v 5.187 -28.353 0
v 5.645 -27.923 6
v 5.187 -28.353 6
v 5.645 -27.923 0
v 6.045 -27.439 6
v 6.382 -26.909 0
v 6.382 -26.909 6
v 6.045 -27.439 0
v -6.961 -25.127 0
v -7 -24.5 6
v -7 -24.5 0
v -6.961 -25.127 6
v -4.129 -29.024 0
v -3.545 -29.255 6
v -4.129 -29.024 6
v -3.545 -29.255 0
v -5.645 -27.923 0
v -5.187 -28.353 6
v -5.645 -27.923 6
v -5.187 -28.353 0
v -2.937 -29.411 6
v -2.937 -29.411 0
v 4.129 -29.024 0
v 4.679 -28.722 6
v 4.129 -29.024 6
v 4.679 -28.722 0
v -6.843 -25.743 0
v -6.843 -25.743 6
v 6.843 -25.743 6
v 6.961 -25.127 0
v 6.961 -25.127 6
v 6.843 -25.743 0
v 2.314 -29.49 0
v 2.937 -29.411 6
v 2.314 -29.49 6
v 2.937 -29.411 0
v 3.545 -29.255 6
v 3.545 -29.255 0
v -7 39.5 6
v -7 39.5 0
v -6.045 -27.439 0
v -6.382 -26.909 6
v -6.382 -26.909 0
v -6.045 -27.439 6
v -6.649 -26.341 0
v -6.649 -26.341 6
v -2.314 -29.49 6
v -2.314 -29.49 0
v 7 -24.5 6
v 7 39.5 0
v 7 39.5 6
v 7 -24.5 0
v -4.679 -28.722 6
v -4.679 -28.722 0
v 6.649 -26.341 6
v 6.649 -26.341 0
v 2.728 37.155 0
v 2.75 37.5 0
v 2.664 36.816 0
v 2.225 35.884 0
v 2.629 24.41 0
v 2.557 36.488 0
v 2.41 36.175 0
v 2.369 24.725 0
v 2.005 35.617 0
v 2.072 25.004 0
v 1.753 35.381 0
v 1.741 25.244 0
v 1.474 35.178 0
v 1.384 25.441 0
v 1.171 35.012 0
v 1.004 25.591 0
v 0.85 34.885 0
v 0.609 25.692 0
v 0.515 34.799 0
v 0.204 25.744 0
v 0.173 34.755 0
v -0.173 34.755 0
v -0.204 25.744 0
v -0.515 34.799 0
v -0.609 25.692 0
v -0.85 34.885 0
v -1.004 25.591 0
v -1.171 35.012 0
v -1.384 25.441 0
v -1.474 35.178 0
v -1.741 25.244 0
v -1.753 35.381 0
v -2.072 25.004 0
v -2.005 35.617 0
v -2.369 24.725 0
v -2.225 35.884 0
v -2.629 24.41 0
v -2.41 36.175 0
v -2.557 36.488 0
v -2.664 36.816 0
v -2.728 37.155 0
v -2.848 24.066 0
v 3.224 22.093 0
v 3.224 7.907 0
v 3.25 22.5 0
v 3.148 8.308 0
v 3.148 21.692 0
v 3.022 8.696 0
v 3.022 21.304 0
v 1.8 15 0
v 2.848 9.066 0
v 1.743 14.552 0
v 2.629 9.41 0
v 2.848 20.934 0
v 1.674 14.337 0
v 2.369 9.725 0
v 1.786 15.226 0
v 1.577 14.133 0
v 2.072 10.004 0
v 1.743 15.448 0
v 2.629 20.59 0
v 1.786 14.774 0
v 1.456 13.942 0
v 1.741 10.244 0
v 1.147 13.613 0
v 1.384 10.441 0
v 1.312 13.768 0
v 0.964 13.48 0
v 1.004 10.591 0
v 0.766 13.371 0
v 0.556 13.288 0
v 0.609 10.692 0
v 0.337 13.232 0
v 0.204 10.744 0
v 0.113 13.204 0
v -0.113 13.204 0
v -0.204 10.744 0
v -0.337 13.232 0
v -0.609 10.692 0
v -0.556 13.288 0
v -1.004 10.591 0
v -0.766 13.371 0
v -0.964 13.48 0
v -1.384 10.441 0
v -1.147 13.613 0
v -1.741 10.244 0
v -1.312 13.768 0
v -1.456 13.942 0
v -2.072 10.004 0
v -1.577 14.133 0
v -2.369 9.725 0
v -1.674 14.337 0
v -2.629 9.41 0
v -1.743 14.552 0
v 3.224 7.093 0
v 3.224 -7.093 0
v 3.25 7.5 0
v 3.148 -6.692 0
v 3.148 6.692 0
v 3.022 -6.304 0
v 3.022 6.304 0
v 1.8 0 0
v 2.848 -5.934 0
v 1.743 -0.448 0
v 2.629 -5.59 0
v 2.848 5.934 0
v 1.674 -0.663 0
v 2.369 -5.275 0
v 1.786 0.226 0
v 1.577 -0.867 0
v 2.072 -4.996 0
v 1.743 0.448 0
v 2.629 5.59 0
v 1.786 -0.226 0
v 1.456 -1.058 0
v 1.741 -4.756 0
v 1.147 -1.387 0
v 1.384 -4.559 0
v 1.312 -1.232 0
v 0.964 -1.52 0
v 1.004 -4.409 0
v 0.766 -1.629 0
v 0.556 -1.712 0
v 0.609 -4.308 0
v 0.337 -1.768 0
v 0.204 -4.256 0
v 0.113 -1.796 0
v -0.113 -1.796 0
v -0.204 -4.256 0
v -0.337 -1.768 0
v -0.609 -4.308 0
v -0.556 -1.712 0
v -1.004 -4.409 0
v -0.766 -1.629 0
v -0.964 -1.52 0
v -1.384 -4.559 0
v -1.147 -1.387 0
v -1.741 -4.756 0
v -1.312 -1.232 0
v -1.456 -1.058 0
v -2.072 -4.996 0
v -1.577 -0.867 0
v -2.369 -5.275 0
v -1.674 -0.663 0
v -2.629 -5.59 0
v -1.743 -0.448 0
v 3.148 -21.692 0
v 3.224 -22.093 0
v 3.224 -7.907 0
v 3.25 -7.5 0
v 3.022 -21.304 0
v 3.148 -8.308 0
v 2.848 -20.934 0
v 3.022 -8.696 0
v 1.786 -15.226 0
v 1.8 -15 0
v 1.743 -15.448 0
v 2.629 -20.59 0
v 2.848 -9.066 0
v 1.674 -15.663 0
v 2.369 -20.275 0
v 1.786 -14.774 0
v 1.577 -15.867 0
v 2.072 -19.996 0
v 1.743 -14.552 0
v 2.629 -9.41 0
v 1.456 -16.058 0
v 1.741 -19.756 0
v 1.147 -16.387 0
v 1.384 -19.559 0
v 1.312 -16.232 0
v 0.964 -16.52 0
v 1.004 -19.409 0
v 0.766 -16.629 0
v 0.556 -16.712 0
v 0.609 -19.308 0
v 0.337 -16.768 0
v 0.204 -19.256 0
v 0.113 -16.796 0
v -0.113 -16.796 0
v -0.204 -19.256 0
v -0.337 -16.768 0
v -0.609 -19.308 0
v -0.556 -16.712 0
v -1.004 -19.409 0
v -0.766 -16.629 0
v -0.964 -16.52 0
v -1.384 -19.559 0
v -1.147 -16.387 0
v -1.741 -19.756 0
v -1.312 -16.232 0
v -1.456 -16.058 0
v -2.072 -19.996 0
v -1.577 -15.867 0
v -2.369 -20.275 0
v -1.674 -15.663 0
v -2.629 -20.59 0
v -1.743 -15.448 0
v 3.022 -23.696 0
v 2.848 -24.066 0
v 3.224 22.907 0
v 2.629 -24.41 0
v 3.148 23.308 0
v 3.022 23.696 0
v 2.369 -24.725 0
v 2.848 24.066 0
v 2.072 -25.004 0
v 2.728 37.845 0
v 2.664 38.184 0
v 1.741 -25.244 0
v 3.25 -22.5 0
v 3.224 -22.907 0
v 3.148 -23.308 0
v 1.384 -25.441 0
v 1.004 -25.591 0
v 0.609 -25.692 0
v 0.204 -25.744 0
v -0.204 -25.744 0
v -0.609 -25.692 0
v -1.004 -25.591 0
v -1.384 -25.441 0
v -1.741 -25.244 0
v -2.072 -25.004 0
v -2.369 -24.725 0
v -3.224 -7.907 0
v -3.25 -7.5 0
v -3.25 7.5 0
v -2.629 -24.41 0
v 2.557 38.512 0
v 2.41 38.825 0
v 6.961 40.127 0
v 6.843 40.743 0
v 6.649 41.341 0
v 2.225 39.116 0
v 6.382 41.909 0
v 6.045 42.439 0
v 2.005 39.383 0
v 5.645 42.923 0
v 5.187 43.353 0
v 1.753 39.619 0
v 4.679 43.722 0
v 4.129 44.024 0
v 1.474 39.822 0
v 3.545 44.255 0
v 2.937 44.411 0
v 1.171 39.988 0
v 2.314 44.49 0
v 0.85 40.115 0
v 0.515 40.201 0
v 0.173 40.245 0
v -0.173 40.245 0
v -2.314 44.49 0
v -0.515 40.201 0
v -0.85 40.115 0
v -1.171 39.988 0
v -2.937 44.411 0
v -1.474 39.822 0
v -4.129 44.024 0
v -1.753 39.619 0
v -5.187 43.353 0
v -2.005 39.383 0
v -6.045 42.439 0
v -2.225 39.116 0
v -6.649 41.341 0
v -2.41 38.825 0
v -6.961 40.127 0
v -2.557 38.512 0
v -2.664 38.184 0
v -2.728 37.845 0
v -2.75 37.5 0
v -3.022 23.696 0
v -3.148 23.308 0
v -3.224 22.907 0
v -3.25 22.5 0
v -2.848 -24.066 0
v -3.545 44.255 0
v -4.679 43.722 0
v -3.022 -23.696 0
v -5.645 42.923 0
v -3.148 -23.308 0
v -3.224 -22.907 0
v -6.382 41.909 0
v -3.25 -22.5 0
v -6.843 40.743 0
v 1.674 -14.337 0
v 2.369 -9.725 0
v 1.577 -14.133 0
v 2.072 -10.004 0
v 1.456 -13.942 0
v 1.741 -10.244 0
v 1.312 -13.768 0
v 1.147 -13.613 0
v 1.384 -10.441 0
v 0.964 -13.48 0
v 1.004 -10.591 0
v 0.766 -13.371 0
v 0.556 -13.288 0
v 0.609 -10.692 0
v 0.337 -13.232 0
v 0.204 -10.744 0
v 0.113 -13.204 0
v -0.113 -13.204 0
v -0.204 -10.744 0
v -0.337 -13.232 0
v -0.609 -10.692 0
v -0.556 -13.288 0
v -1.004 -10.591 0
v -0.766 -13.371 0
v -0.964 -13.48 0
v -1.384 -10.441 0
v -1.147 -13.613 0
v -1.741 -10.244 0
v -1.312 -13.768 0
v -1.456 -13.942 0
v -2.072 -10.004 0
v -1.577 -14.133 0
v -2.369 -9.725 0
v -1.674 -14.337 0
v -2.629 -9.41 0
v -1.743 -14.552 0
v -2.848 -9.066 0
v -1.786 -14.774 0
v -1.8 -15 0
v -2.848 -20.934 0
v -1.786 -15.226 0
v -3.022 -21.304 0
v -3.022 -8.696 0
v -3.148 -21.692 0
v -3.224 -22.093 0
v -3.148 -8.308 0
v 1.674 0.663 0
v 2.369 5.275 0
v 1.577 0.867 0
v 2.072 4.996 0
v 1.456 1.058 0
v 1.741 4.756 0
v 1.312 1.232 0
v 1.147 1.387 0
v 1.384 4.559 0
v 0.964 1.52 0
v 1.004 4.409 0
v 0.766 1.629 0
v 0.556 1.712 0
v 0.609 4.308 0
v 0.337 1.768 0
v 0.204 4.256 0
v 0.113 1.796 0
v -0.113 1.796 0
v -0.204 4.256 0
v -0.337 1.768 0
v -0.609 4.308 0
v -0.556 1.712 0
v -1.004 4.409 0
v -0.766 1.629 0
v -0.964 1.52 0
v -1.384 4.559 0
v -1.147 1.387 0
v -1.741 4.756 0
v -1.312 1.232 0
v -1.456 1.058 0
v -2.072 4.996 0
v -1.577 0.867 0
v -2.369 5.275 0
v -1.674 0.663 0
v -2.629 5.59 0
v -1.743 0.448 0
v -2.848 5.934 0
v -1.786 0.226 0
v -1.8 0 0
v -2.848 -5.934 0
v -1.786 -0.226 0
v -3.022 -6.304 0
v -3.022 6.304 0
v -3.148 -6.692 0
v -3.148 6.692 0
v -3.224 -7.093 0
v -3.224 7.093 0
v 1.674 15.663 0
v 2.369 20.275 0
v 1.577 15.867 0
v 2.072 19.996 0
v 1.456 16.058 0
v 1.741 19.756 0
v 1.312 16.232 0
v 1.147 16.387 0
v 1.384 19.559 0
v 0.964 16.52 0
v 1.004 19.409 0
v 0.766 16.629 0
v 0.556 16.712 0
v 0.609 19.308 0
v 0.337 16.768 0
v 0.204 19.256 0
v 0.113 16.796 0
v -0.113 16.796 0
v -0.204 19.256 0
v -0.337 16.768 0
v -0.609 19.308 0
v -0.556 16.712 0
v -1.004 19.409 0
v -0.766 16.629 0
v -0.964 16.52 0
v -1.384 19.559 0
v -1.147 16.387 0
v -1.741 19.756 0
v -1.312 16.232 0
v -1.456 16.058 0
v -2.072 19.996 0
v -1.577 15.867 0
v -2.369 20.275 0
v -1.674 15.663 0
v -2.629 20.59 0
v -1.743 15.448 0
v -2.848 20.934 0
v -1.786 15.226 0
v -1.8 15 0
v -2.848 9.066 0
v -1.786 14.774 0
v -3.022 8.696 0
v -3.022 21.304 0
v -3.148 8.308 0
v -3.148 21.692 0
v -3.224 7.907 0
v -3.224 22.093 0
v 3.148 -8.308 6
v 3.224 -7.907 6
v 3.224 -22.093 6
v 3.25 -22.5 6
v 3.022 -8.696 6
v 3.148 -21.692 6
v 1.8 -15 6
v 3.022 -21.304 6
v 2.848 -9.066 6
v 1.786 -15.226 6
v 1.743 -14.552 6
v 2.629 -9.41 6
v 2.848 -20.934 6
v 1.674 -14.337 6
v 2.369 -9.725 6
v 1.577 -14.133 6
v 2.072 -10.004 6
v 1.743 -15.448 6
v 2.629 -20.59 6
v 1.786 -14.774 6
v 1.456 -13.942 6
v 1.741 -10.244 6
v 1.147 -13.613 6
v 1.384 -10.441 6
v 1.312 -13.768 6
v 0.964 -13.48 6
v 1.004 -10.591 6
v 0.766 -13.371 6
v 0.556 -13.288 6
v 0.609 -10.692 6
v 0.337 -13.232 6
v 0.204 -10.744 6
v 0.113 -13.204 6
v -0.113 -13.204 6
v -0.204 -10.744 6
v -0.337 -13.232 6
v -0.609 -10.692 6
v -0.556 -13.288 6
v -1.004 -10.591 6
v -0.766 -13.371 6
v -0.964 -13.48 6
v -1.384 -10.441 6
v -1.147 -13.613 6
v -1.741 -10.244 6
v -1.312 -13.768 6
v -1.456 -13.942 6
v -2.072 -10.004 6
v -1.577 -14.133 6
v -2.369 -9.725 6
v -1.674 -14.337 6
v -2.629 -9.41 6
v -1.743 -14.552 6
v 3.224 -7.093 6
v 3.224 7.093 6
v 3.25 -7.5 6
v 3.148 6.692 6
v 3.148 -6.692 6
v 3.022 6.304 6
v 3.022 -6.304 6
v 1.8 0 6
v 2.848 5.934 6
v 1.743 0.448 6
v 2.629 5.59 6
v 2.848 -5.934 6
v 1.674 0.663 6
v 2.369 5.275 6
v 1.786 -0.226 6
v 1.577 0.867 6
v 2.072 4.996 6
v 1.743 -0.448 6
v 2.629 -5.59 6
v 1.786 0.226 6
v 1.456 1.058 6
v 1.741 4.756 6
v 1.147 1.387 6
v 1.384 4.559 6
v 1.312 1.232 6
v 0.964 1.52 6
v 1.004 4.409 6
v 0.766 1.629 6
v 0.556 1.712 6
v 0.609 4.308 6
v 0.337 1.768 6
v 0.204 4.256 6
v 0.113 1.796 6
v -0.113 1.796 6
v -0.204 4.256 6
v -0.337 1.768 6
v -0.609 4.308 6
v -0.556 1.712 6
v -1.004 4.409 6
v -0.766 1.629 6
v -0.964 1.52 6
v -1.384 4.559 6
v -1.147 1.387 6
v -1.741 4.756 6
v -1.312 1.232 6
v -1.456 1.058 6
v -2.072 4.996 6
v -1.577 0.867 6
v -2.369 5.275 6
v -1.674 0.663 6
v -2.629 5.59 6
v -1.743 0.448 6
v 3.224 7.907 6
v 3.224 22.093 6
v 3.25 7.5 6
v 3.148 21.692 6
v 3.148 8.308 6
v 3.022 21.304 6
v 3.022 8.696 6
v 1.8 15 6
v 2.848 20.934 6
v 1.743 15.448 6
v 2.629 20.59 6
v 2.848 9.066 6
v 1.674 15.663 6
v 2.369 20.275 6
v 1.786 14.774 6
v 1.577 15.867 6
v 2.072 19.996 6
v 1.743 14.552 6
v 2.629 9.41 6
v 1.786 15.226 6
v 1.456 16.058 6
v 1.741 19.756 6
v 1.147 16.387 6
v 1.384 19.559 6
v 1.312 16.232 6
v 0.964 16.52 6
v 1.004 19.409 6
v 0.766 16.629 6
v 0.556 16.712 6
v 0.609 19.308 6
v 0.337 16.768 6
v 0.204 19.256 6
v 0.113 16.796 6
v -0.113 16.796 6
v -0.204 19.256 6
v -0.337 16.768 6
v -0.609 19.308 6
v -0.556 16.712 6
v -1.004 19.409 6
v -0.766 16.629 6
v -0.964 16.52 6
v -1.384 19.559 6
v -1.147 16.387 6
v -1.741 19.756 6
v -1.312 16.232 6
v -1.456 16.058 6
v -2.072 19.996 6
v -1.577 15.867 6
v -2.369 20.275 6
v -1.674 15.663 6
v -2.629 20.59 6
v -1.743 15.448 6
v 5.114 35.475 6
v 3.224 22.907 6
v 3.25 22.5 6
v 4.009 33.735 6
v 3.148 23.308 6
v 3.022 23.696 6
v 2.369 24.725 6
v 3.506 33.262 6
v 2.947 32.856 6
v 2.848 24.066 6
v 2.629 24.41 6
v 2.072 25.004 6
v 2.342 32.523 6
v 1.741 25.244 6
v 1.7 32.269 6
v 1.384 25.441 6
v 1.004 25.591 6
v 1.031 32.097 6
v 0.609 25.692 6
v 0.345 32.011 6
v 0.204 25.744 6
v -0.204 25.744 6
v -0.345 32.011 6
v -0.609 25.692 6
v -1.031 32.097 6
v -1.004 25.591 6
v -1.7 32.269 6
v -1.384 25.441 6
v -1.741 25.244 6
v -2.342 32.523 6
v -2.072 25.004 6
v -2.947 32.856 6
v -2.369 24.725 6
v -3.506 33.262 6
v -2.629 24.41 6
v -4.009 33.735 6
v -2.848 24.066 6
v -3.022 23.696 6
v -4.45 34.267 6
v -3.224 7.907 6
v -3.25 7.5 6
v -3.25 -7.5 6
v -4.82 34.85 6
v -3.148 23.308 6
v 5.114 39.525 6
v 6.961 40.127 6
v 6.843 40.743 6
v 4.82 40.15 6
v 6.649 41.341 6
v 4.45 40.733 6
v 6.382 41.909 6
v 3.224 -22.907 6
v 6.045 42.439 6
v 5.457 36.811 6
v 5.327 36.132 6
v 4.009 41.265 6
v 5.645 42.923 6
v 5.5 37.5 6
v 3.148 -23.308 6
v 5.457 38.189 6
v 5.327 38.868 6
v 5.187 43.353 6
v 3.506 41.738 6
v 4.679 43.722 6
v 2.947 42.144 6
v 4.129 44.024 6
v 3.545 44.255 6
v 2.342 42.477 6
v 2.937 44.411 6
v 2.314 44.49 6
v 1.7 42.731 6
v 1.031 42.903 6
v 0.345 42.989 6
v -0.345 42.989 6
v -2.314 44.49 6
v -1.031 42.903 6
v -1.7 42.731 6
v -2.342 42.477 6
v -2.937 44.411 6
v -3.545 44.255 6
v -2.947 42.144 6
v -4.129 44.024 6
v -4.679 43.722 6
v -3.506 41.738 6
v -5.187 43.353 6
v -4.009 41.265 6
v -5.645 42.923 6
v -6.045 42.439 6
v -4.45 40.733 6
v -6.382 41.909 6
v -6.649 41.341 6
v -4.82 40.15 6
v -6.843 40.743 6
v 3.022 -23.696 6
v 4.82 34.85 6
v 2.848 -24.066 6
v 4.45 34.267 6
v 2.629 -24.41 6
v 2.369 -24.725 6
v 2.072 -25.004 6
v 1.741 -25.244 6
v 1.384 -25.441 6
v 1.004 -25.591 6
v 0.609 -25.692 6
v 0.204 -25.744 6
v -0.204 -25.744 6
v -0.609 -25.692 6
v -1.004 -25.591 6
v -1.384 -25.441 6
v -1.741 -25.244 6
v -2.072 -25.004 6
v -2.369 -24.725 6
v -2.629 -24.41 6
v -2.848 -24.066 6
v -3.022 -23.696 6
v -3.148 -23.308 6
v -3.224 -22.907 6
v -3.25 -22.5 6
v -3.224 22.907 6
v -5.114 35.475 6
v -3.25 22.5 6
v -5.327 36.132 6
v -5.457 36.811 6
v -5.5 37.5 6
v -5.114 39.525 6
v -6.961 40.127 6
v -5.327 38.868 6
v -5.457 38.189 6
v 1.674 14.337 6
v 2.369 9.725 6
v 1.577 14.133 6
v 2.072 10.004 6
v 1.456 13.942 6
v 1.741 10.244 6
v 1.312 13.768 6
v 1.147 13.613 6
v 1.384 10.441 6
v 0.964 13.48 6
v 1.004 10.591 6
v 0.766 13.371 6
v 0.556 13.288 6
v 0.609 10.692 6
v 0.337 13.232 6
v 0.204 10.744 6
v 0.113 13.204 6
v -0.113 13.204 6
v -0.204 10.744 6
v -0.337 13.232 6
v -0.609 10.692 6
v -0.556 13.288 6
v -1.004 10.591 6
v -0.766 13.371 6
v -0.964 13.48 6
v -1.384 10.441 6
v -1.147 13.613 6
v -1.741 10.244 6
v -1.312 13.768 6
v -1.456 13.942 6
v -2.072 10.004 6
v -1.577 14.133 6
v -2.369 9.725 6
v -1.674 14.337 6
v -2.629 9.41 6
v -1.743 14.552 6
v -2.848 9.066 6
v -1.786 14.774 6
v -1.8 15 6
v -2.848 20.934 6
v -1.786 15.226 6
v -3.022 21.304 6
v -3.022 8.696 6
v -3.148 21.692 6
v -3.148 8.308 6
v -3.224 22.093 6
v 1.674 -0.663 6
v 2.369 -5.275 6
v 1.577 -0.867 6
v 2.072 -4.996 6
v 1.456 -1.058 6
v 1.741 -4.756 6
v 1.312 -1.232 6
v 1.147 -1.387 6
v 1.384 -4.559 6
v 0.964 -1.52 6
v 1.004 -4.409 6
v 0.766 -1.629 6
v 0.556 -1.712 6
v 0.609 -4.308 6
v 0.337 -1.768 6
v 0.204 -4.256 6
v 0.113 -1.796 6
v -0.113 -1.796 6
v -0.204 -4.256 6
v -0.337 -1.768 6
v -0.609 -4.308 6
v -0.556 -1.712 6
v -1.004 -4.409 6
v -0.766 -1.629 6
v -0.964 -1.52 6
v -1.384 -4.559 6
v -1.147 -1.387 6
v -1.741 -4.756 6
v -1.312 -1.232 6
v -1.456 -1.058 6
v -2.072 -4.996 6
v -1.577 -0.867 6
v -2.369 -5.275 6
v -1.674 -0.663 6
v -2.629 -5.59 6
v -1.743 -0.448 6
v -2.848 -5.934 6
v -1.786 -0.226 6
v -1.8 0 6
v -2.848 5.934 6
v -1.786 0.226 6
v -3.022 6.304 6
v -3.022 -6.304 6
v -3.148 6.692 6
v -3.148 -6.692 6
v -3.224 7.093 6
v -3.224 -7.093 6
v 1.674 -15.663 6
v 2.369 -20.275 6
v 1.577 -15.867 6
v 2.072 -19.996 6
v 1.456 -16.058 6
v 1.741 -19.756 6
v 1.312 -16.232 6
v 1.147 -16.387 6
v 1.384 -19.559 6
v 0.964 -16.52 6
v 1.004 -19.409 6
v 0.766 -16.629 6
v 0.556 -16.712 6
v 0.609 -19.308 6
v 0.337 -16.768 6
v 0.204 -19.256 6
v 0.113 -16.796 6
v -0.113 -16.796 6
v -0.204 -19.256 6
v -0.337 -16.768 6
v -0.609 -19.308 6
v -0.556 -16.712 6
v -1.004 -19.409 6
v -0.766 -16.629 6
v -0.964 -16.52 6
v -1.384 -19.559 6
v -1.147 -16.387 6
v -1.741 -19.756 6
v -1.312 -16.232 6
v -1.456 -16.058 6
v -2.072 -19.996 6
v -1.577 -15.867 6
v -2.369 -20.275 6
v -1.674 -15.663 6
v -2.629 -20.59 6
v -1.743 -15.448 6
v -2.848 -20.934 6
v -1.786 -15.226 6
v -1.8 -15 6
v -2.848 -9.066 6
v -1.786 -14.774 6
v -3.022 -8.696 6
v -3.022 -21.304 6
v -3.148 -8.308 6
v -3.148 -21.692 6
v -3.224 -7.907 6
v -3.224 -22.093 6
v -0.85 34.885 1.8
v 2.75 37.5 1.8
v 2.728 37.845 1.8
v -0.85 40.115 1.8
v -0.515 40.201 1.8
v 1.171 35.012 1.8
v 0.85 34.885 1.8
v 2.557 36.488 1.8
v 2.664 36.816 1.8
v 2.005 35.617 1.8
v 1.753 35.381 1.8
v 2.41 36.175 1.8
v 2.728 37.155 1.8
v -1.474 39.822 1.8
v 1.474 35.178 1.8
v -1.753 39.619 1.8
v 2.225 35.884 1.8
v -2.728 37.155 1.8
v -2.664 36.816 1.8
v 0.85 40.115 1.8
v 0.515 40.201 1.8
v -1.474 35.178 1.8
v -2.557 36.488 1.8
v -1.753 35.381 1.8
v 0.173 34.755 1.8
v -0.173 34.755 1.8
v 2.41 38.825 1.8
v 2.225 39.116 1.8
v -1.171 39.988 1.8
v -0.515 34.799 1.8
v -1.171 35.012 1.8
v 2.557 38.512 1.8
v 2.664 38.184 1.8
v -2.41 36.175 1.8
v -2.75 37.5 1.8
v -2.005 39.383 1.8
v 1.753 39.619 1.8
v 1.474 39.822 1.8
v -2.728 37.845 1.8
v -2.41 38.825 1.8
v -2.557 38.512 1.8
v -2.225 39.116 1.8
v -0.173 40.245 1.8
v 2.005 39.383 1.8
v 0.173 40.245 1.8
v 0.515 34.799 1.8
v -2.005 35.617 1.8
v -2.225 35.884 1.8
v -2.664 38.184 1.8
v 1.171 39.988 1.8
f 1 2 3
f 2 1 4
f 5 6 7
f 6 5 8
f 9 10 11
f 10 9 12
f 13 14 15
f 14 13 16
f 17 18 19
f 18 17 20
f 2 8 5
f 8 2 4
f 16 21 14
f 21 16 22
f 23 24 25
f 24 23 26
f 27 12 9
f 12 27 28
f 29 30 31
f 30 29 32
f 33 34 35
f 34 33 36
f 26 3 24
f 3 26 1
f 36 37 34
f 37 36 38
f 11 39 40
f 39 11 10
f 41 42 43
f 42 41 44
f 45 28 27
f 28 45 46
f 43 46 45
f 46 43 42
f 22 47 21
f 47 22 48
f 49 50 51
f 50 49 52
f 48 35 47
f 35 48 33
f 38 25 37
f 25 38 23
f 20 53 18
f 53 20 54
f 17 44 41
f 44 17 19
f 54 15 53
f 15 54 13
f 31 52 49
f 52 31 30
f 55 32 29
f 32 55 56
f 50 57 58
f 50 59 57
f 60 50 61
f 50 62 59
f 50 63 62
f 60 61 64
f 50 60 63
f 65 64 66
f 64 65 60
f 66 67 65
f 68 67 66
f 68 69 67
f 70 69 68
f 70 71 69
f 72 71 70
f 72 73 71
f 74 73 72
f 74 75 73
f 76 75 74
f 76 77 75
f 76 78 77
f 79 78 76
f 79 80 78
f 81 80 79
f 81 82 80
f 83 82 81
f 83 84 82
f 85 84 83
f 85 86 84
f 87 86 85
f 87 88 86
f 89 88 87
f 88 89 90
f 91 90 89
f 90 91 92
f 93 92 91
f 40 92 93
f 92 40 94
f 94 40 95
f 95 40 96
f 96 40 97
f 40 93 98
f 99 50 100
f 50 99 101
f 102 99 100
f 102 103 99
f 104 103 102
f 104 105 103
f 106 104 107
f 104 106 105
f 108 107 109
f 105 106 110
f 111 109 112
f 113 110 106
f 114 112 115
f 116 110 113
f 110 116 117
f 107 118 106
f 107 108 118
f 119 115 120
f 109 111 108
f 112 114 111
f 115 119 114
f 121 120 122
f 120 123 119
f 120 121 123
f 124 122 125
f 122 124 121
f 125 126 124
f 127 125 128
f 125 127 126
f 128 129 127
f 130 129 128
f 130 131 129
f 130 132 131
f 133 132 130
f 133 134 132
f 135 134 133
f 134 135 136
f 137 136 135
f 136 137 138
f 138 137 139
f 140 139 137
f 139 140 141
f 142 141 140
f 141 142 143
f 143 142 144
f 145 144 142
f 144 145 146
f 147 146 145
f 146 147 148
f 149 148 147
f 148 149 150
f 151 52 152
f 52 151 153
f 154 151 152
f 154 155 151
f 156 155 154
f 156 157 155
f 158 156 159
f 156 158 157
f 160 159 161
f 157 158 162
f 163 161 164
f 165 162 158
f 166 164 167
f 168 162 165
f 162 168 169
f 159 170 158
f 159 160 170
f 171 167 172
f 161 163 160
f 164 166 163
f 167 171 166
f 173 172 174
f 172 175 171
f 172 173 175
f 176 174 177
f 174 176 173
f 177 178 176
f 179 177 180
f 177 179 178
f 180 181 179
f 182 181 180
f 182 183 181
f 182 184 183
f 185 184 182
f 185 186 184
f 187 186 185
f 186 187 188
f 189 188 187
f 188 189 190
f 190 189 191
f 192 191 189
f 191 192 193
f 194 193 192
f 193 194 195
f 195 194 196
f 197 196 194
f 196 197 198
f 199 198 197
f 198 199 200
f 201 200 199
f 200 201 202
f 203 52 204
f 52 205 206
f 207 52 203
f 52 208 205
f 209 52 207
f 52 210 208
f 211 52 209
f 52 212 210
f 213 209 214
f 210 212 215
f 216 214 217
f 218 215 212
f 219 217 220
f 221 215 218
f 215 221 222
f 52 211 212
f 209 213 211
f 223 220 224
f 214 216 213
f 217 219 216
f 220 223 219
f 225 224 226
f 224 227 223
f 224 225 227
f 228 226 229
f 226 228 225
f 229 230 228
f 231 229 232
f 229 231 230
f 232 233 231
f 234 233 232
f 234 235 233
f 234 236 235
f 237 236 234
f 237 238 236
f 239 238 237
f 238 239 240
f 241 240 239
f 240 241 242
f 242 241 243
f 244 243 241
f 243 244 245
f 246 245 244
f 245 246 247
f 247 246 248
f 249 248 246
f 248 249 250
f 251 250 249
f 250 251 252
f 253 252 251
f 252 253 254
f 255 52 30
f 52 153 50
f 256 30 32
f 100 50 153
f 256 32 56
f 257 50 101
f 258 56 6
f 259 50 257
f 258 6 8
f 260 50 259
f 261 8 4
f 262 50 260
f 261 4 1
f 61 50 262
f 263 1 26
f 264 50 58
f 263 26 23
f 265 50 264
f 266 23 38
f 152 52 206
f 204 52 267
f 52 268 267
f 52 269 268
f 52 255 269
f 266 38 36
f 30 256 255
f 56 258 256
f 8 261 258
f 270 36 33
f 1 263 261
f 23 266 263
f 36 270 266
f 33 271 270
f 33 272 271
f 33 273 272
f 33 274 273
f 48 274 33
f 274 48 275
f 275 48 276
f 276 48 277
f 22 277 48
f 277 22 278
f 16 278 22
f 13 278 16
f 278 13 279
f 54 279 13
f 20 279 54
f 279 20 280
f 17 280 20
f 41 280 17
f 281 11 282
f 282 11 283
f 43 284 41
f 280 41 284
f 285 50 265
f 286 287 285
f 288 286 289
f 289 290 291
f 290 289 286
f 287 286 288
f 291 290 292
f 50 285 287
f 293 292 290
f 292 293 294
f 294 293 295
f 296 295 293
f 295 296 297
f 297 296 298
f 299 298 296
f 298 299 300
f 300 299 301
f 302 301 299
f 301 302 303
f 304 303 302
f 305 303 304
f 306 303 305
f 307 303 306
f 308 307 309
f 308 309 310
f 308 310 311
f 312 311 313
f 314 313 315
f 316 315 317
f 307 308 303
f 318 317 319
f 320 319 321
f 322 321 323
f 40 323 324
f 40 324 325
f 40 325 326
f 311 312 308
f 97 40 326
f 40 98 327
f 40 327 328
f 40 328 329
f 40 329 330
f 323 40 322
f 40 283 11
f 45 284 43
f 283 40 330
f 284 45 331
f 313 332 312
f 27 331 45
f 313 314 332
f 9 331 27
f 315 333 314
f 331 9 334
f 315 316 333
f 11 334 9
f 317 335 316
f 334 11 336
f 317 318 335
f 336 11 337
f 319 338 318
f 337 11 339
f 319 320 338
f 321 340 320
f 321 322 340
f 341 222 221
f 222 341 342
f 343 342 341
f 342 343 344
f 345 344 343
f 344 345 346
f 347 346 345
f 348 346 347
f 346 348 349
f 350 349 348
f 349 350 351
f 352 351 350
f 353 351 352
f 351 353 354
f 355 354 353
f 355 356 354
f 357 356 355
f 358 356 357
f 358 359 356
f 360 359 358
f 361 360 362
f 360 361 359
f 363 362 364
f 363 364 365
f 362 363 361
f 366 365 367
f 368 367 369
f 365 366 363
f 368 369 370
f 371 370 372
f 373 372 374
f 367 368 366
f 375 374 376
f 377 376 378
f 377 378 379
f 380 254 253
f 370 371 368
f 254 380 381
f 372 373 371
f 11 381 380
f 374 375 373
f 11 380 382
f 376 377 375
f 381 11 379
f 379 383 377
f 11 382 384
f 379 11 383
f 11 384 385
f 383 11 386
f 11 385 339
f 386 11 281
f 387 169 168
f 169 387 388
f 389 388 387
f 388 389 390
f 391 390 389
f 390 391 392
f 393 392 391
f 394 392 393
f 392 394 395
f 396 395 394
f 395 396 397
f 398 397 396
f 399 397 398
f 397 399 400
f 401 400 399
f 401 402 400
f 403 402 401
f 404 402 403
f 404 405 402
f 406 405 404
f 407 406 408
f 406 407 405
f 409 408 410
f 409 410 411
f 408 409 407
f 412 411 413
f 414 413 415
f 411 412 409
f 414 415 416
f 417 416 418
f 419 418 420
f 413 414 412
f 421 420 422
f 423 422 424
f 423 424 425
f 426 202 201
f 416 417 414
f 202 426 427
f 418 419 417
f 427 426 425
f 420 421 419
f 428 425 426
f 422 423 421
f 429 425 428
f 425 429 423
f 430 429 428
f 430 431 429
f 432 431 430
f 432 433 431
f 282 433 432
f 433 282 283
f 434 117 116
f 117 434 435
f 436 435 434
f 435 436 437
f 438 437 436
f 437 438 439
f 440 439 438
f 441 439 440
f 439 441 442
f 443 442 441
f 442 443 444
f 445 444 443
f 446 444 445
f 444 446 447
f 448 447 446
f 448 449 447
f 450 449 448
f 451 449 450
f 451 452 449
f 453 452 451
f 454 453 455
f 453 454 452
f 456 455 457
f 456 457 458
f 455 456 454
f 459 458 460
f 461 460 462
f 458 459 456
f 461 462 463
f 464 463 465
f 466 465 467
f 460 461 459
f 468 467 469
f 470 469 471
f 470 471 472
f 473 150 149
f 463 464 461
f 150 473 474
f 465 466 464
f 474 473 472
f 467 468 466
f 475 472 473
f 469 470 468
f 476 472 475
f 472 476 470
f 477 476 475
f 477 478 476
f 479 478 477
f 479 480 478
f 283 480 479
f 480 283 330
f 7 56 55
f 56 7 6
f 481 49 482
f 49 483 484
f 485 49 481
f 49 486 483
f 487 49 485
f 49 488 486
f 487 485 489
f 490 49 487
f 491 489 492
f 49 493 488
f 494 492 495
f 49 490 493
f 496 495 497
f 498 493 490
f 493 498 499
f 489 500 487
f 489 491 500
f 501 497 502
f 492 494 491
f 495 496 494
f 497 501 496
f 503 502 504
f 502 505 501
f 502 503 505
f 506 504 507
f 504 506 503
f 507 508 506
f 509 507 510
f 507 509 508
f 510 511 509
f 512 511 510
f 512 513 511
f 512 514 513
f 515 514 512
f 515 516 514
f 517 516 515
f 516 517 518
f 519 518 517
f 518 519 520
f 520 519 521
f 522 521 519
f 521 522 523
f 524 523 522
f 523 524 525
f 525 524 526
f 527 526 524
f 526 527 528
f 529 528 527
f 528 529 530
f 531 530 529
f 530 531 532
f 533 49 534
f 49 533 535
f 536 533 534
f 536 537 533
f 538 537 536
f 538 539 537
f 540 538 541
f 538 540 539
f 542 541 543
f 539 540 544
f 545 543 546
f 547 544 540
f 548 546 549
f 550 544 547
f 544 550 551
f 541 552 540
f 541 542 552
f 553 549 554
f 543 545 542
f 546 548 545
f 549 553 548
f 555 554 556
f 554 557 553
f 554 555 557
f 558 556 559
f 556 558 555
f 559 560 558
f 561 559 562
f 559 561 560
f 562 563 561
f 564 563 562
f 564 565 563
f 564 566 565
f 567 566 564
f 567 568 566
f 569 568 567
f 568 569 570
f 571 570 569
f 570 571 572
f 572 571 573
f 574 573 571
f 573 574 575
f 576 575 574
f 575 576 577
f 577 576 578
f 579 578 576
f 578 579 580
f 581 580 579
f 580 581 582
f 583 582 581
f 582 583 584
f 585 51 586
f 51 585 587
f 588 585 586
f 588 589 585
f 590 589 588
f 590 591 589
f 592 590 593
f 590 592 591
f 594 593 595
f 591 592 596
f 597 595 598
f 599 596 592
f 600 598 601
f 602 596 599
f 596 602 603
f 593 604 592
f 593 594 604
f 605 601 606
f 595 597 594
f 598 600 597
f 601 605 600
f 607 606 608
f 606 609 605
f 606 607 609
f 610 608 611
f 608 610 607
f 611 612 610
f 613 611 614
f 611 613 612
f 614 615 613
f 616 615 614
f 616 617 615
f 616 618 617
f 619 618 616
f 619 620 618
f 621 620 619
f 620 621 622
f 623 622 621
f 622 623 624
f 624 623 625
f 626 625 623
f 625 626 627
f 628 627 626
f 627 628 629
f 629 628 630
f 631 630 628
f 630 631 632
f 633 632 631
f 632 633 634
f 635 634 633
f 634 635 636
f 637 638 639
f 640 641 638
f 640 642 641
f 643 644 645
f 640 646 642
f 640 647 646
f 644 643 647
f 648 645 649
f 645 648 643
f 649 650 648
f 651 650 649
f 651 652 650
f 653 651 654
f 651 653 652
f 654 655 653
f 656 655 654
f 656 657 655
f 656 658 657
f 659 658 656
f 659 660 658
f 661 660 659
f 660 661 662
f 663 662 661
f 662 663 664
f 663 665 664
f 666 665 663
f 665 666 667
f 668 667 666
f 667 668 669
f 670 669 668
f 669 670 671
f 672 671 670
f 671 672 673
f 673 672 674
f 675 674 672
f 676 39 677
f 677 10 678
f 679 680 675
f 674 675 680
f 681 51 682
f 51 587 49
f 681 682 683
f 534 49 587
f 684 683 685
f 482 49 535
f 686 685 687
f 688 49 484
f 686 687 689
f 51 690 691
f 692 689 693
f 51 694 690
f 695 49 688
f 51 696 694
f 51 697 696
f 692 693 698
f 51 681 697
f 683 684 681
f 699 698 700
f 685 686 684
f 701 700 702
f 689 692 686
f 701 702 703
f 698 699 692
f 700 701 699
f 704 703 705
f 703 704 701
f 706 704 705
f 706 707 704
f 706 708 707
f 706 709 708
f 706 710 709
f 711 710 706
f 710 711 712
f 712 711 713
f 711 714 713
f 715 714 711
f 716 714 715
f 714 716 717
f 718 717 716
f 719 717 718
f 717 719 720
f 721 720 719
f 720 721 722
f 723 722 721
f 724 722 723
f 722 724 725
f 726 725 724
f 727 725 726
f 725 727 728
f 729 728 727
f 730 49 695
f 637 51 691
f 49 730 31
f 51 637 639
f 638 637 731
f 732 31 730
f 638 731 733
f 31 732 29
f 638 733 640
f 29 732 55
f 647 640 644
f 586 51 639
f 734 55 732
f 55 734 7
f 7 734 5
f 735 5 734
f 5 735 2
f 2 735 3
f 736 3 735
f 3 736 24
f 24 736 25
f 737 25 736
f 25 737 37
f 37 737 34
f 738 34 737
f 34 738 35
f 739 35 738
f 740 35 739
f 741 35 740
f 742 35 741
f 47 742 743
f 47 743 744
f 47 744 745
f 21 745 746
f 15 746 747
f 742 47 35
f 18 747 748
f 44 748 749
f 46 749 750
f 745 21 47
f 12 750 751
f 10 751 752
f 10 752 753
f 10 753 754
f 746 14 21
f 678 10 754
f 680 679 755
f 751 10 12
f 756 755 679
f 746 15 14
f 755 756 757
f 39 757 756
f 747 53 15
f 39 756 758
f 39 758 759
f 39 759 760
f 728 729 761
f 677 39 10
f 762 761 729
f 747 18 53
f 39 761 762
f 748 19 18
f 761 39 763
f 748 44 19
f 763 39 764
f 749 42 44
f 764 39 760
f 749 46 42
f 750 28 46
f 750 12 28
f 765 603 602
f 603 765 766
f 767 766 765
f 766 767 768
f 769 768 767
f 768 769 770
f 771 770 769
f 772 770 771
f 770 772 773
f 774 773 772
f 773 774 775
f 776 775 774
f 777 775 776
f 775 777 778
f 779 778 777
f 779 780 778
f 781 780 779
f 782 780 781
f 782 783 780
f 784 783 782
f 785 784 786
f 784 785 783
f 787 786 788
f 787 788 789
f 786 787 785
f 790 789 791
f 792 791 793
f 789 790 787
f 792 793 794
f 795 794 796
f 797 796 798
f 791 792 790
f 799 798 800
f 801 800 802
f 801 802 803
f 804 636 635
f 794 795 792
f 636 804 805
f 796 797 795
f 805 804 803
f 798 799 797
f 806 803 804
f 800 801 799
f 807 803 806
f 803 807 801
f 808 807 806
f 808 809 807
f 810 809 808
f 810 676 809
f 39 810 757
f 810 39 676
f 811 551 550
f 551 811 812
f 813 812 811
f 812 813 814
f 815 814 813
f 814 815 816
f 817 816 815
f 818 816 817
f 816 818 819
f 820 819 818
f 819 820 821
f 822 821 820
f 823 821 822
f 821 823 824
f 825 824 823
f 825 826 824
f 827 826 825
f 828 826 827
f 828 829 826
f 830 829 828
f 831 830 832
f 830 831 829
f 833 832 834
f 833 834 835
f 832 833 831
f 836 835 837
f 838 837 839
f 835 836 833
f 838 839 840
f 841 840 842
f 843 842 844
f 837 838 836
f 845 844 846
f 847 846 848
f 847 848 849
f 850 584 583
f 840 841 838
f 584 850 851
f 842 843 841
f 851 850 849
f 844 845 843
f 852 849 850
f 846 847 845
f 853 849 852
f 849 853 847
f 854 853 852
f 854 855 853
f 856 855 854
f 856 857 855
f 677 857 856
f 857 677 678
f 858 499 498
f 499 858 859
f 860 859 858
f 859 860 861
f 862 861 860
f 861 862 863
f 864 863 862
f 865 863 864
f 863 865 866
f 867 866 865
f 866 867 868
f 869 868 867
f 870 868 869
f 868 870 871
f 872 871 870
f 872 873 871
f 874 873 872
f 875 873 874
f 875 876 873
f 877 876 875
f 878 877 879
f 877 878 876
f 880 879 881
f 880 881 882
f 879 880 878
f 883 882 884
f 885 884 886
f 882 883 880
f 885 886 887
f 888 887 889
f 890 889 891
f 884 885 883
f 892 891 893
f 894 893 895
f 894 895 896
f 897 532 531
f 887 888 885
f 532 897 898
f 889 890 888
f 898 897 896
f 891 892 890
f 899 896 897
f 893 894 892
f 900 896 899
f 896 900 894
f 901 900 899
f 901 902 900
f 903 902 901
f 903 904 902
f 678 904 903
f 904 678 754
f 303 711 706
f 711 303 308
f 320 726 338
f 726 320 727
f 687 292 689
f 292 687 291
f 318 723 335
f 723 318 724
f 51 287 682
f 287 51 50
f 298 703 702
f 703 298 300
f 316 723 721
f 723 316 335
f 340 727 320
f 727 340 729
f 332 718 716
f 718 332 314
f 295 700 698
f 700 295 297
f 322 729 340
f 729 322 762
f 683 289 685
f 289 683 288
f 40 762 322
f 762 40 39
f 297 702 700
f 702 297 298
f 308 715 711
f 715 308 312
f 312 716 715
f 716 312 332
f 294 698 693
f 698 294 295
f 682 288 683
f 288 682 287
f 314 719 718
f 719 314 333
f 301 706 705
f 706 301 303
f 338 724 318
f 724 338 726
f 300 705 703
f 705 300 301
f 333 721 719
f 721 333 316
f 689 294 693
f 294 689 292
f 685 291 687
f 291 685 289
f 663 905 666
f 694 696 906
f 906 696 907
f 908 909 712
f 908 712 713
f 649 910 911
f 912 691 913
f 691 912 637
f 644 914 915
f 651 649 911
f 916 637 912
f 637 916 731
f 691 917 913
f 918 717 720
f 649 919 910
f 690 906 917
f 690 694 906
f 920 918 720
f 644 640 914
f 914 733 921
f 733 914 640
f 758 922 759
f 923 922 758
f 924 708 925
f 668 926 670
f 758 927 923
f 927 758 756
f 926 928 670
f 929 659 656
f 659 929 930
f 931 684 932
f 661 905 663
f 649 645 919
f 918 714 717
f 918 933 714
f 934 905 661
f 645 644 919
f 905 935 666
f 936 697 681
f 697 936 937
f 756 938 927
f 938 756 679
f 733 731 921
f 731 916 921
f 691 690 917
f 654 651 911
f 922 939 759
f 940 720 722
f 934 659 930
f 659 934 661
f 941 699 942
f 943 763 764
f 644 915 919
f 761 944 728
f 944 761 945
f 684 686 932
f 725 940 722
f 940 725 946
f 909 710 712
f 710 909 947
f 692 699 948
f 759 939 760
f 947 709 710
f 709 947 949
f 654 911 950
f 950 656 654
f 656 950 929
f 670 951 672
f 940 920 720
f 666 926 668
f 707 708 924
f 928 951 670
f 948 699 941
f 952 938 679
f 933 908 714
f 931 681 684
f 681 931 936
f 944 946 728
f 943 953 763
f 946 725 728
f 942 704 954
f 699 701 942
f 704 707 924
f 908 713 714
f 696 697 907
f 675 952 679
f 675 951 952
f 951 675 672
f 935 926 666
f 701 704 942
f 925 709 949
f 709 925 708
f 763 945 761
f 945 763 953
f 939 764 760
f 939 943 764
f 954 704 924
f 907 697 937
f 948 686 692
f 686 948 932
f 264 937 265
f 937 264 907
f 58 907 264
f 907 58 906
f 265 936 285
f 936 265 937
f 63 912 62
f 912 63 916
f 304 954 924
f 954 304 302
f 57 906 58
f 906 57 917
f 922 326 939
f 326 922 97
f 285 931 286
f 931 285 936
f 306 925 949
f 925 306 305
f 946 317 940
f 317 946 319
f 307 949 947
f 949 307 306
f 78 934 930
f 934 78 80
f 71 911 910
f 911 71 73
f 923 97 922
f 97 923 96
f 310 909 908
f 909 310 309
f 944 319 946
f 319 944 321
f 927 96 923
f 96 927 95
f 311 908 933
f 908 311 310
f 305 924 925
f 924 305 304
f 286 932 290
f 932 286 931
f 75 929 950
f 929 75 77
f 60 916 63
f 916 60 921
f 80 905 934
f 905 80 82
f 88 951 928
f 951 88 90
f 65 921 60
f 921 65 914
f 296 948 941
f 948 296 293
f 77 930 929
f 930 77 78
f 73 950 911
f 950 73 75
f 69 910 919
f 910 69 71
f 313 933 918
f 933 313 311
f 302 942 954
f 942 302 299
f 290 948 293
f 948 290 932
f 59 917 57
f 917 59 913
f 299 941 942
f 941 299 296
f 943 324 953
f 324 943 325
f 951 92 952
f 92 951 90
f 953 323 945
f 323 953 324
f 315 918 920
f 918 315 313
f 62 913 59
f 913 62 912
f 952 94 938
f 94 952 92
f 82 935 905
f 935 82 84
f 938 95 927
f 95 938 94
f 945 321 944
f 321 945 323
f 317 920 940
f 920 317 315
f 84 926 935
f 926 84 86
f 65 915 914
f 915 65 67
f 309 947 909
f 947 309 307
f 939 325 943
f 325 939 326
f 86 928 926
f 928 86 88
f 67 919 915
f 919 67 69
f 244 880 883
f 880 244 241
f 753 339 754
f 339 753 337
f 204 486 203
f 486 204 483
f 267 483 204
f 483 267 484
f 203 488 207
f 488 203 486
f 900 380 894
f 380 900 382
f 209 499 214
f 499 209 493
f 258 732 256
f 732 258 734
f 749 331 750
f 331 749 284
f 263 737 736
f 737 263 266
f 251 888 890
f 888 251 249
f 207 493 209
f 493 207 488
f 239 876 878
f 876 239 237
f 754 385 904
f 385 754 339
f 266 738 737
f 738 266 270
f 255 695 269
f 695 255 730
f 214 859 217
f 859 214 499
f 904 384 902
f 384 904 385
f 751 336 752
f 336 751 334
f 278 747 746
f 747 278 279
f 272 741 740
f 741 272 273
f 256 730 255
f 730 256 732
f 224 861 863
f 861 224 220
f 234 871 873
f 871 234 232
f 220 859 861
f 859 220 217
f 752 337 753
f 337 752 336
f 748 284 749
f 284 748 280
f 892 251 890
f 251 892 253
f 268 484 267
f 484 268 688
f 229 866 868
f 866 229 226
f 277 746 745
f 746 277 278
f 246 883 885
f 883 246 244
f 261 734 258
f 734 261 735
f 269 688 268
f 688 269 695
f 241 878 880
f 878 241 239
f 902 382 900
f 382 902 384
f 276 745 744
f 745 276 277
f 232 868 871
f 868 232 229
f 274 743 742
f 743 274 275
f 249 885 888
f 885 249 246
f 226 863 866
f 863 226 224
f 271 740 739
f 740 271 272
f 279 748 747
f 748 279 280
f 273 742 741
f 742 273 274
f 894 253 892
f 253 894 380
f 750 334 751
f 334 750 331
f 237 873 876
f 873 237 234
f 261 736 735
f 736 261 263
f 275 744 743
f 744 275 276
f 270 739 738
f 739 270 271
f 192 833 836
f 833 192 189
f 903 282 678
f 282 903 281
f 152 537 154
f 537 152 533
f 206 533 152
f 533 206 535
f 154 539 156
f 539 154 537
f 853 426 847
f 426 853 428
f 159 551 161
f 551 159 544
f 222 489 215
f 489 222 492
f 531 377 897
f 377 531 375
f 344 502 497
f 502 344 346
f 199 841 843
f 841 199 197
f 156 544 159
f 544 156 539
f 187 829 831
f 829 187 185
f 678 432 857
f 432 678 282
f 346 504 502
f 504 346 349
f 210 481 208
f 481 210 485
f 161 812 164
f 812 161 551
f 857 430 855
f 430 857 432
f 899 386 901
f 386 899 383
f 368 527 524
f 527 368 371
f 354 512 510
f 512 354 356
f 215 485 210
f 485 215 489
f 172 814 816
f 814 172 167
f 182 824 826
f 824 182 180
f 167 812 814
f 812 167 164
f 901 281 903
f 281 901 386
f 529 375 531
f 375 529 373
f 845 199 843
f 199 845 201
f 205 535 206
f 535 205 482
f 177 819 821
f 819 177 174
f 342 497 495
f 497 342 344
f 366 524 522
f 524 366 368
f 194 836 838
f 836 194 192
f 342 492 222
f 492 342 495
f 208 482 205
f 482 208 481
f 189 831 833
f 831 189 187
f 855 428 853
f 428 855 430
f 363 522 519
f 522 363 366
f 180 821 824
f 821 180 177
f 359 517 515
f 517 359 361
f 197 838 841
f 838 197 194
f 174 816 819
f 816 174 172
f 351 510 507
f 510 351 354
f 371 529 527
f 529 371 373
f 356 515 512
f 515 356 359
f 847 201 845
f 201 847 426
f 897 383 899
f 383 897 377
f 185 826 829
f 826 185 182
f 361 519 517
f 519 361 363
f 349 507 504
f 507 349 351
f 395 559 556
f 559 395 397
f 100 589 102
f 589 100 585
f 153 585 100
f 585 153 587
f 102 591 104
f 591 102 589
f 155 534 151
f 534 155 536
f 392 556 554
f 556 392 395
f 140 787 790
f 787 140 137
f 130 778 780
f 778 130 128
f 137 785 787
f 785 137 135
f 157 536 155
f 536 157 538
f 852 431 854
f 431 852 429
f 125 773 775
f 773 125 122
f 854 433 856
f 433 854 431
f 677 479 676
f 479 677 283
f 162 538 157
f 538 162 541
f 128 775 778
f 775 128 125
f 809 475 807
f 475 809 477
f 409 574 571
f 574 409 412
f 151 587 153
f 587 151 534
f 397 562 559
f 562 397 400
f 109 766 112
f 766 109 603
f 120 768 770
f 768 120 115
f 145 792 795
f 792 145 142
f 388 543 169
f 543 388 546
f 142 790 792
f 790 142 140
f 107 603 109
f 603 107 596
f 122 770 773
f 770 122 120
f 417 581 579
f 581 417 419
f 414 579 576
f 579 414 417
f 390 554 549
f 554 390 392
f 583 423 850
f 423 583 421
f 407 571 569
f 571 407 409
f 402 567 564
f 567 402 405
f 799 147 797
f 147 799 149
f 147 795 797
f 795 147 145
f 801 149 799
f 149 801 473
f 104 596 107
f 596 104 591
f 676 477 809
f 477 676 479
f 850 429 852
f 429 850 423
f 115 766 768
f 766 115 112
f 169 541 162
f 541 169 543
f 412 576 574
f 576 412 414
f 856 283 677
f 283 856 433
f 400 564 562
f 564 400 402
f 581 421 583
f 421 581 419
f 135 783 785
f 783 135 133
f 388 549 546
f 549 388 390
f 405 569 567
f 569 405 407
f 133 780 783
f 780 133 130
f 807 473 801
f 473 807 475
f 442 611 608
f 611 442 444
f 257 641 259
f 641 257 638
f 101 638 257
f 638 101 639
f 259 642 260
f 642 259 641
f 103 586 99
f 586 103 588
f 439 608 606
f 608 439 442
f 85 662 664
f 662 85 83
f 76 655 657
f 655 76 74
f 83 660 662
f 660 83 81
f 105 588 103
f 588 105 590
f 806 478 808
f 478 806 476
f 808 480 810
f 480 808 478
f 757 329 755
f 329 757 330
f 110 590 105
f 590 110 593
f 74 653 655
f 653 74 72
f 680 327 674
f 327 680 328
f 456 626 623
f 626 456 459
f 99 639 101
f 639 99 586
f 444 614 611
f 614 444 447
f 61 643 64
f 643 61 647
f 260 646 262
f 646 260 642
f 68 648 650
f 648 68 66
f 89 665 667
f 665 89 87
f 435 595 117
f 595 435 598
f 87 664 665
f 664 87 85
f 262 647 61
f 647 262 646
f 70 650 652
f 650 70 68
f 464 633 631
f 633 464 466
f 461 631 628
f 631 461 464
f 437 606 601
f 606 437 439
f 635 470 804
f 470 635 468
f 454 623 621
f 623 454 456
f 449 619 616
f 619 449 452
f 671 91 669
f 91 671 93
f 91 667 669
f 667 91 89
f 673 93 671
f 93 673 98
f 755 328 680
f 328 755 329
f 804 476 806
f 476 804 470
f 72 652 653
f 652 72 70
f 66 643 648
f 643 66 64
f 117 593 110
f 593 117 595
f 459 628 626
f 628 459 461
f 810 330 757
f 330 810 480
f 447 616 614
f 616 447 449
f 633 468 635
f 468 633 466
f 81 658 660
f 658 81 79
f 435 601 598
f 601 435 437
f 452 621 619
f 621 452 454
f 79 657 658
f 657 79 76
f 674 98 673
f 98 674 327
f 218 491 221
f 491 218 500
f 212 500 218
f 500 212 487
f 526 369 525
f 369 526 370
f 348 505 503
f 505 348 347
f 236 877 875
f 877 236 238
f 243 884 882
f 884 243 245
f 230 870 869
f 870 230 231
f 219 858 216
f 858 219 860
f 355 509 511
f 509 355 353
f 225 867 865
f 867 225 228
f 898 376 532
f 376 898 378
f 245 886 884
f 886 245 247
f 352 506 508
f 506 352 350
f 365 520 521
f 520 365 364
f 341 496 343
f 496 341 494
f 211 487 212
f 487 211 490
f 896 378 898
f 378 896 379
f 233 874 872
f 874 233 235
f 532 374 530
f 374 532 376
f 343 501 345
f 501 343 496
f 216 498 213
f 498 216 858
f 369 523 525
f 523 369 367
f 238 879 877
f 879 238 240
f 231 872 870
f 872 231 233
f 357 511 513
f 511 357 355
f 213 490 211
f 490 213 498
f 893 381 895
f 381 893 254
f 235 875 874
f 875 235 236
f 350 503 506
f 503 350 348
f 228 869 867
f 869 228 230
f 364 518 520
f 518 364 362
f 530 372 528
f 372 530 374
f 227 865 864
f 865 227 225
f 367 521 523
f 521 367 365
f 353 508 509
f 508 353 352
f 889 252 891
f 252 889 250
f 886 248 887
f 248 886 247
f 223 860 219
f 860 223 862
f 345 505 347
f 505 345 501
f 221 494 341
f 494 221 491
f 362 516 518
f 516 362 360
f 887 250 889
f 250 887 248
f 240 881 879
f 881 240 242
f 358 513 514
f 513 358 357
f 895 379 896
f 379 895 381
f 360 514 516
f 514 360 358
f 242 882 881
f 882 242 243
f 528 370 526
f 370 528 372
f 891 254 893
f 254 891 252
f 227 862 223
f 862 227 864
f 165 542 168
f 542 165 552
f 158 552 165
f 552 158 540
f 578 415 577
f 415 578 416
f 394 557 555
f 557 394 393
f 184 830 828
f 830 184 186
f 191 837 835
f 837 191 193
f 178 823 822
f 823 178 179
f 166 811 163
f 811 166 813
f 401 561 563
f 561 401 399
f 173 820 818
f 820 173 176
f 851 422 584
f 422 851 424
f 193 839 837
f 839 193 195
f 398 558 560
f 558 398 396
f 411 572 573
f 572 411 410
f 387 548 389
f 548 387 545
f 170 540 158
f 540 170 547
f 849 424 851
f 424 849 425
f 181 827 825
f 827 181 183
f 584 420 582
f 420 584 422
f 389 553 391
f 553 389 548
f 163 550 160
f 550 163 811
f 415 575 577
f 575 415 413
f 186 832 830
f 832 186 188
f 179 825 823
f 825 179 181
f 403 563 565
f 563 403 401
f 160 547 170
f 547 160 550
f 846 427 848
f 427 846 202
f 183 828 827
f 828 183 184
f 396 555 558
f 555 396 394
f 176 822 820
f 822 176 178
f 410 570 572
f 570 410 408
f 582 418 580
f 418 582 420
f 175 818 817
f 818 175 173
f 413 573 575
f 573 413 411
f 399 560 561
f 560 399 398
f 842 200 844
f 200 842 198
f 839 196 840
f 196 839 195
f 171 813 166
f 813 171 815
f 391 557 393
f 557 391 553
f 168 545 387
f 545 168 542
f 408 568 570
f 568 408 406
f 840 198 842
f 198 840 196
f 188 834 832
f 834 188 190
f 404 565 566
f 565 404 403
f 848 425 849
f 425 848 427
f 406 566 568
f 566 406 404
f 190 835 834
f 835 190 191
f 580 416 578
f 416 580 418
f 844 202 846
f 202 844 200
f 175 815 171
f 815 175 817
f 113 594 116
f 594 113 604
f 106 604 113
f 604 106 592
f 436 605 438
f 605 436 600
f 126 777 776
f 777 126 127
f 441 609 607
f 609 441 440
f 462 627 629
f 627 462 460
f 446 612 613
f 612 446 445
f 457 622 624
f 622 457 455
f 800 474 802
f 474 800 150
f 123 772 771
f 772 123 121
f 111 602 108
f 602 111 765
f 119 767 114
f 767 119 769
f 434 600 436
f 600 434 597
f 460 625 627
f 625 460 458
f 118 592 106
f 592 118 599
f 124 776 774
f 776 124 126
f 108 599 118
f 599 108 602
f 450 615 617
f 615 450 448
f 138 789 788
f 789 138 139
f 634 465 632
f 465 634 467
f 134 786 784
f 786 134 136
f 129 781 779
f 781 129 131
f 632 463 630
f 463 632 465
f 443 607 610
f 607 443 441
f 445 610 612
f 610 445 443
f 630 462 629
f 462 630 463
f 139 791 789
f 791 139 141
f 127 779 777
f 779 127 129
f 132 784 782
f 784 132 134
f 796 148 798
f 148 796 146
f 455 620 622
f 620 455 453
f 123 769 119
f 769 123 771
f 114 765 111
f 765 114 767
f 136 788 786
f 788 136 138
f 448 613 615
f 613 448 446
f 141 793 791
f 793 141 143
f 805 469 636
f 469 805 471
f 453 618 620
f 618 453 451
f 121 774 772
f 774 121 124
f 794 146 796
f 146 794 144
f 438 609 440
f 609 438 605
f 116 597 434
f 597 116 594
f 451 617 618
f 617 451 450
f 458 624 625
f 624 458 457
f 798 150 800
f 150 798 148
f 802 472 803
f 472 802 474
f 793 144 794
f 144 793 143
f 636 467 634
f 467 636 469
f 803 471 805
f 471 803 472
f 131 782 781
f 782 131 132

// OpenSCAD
$fn = 50;


difference() {
	union() {
		hull() {
			translate(v = [-2.0000000000, 24.5000000000, 0]) {
				cylinder(h = 6, r = 5);
			}
			translate(v = [2.0000000000, 24.5000000000, 0]) {
				cylinder(h = 6, r = 5);
			}
			translate(v = [-2.0000000000, -24.5000000000, 0]) {
				cylinder(h = 6, r = 5);
			}
			translate(v = [2.0000000000, -24.5000000000, 0]) {
				cylinder(h = 6, r = 5);
			}
		}
		translate(v = [0.0000000000, 30.0000000000, 0]) {
			hull() {
				translate(v = [-2.0000000000, 9.5000000000, 0]) {
					cylinder(h = 6, r = 5);
				}
				translate(v = [2.0000000000, 9.5000000000, 0]) {
					cylinder(h = 6, r = 5);
				}
				translate(v = [-2.0000000000, -9.5000000000, 0]) {
					cylinder(h = 6, r = 5);
				}
				translate(v = [2.0000000000, -9.5000000000, 0]) {
					cylinder(h = 6, r = 5);
				}
			}
		}
		translate(v = [0.0000000000, 30.0000000000, 0]) {
			hull() {
				translate(v = [-2.0000000000, 9.5000000000, 0]) {
					cylinder(h = 6, r = 5);
				}
				translate(v = [2.0000000000, 9.5000000000, 0]) {
					cylinder(h = 6, r = 5);
				}
				translate(v = [-2.0000000000, -9.5000000000, 0]) {
					cylinder(h = 6, r = 5);
				}
				translate(v = [2.0000000000, -9.5000000000, 0]) {
					cylinder(h = 6, r = 5);
				}
			}
		}
	}
	union() {
		translate(v = [0.0000000000, 37.5000000000, 6]) {
			rotate(a = [0, 0, 0]) {
				difference() {
					union() {
						#translate(v = [0, 0, -6.0000000000]) {
							cylinder(h = 6, r = 2.2500000000);
						}
						#translate(v = [0, 0, -4.2000000000]) {
							cylinder(h = 4.2000000000, r1 = 2.7500000000, r2 = 5.5000000000);
						}
						#translate(v = [0, 0, -6.0000000000]) {
							cylinder(h = 6, r = 2.7500000000);
						}
						#translate(v = [0, 0, -6.0000000000]) {
							cylinder(h = 6, r = 2.2500000000);
						}
					}
					union();
				}
			}
		}
		translate(v = [0.0000000000, 37.5000000000, 6]) {
			rotate(a = [0, 0, 0]) {
				difference() {
					union() {
						#translate(v = [0, 0, -6.0000000000]) {
							cylinder(h = 6, r = 2.2500000000);
						}
						#translate(v = [0, 0, -4.2000000000]) {
							cylinder(h = 4.2000000000, r1 = 2.7500000000, r2 = 5.5000000000);
						}
						#translate(v = [0, 0, -6.0000000000]) {
							cylinder(h = 6, r = 2.7500000000);
						}
						#translate(v = [0, 0, -6.0000000000]) {
							cylinder(h = 6, r = 2.2500000000);
						}
					}
					union();
				}
			}
		}
		translate(v = [0.0000000000, -22.5000000000, 0]) {
			translate(v = [0, 0, -100]) {
				cylinder(h = 200, r = 3.2500000000);
			}
		}
		translate(v = [0.0000000000, -7.5000000000, 0]) {
			translate(v = [0, 0, -100]) {
				cylinder(h = 200, r = 3.2500000000);
			}
		}
		translate(v = [0.0000000000, 7.5000000000, 0]) {
			translate(v = [0, 0, -100]) {
				cylinder(h = 200, r = 3.2500000000);
			}
		}
		translate(v = [0.0000000000, 22.5000000000, 0]) {
			translate(v = [0, 0, -100]) {
				cylinder(h = 200, r = 3.2500000000);
			}
		}
		translate(v = [0.0000000000, -22.5000000000, 0]) {
			translate(v = [0, 0, -100]) {
				cylinder(h = 200, r = 1.8000000000);
			}
		}
		translate(v = [0.0000000000, -15.0000000000, 0]) {
			translate(v = [0, 0, -100]) {
				cylinder(h = 200, r = 1.8000000000);
			}
		}
		translate(v = [0.0000000000, -7.5000000000, 0]) {
			translate(v = [0, 0, -100]) {
				cylinder(h = 200, r = 1.8000000000);
			}
		}
		translate(v = [0, 0, -100]) {
			cylinder(h = 200, r = 1.8000000000);
		}
		translate(v = [0.0000000000, 7.5000000000, 0]) {
			translate(v = [0, 0, -100]) {
				cylinder(h = 200, r = 1.8000000000);
			}
		}
		translate(v = [0.0000000000, 15.0000000000, 0]) {
			translate(v = [0, 0, -100]) {
				cylinder(h = 200, r = 1.8000000000);
			}
		}
		translate(v = [0.0000000000, 22.5000000000, 0]) {
			translate(v = [0, 0, -100]) {
				cylinder(h = 200, r = 1.8000000000);
			}
		}
	}
}
